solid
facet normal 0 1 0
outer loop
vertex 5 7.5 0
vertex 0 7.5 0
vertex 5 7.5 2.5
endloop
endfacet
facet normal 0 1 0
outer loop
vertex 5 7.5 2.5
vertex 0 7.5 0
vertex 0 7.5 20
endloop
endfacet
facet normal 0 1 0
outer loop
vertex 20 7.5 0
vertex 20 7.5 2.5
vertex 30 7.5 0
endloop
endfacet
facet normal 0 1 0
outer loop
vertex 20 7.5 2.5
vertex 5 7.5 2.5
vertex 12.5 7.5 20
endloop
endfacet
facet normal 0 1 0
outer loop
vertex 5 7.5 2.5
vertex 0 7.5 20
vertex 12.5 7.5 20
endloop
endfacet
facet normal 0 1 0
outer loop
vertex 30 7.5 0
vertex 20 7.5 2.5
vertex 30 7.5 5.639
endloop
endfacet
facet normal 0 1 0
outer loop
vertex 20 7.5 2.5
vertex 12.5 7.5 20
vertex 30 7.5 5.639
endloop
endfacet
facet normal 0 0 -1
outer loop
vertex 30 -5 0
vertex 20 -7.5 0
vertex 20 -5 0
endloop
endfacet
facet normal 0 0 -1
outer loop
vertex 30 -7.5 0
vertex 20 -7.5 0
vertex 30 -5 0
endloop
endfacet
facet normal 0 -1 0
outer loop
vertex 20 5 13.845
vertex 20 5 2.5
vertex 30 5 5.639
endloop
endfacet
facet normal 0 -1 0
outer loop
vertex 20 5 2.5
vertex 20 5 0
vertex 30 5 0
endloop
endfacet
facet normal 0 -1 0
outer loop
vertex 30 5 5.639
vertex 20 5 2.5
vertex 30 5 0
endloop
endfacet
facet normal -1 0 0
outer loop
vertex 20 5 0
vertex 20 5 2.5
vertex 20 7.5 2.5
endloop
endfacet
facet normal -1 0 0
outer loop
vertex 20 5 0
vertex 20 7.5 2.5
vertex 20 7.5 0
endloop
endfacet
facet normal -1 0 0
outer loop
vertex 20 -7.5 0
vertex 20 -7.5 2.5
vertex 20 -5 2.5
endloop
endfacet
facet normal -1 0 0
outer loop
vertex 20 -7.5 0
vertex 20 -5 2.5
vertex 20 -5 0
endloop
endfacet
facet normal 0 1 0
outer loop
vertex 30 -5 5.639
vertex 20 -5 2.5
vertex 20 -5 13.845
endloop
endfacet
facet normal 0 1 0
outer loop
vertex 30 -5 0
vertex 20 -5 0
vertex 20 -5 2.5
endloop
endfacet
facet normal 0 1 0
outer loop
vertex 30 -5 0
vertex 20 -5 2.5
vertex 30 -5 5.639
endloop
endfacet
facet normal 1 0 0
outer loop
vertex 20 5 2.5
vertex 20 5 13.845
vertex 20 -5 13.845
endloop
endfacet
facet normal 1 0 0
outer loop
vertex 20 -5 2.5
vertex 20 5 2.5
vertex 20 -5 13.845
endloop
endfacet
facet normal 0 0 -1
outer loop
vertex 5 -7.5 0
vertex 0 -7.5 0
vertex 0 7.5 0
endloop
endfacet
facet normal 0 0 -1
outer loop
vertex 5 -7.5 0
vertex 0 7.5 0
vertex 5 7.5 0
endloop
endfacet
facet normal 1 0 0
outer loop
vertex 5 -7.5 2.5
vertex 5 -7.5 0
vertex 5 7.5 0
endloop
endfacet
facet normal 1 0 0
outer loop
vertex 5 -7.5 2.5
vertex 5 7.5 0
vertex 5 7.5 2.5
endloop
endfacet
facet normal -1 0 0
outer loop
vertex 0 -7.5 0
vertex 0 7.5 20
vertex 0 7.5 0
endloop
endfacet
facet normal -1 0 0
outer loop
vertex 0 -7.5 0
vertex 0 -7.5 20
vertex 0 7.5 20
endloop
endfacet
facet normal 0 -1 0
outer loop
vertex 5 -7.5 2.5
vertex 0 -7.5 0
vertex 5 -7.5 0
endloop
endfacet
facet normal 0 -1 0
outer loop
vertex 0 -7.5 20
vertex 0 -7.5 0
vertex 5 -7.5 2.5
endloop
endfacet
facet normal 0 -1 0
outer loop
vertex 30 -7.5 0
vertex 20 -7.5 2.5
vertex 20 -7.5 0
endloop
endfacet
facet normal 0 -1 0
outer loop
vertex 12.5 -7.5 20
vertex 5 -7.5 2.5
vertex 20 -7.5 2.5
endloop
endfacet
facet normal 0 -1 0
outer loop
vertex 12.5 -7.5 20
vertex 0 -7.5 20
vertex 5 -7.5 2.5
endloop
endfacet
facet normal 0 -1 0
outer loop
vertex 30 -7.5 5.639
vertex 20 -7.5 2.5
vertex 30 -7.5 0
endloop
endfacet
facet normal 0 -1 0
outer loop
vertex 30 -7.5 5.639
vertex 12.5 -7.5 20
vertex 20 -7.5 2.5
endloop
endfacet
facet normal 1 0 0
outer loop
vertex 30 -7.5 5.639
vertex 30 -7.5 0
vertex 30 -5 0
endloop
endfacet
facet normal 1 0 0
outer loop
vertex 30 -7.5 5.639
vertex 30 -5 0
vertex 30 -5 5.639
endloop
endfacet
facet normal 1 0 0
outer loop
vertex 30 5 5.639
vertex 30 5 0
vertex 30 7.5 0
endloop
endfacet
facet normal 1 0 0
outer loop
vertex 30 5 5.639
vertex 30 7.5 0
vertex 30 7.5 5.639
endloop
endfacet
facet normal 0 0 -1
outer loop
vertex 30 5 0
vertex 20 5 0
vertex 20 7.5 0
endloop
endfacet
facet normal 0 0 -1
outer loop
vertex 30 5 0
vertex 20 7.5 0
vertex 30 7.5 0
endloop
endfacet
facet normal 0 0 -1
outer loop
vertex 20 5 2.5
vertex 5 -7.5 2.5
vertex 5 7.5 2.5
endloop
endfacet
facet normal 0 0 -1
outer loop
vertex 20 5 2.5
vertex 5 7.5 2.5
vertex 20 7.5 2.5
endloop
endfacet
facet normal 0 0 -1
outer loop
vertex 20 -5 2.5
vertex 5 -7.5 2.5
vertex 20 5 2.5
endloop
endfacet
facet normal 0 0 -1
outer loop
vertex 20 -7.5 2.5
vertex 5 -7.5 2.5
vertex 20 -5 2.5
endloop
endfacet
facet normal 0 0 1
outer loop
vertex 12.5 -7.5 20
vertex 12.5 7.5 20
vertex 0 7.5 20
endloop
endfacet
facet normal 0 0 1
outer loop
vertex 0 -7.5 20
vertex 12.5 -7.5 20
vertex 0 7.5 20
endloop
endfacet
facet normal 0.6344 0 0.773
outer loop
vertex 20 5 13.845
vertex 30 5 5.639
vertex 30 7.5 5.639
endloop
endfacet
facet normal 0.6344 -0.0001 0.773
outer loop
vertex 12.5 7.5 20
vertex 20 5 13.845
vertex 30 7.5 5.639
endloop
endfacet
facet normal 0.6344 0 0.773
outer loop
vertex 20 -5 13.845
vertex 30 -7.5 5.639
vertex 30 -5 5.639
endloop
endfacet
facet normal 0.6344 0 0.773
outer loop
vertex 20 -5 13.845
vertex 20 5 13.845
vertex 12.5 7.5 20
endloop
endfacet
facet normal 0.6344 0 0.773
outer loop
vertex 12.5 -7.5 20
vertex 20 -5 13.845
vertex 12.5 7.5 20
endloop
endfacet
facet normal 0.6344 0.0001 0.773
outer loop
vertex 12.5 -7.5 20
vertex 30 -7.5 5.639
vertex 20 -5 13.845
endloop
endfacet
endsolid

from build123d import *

# Parameters (mm, degrees)
F1_DEPTH = 7.5
F2_W     = 35.456628
F2_H     = 10
F3_DEPTH = 20.001


with BuildPart() as f1:
    # F0 (on Front) → F1 (new body, symmetric)
    with BuildSketch(Plane.XZ):
        Polygon((0, 20), (0, 0), (5, 0), (5, 2.5), (20, 2.5), (20, 0), (30, 0), (30, 5.639098), (12.5, 20), align=None)
    extrude(amount=F1_DEPTH, both=True)

    # F2 (on face) → F3 (cut, through all)
    with BuildSketch(Plane(origin=(0, 0, 0), x_dir=(1, 0, 0), z_dir=(0, 0, -1))):
        with Locations((37.728314, 0)):
            Rectangle(F2_W, F2_H)
    extrude(amount=-F3_DEPTH, mode=Mode.SUBTRACT)


solid = f1.part
